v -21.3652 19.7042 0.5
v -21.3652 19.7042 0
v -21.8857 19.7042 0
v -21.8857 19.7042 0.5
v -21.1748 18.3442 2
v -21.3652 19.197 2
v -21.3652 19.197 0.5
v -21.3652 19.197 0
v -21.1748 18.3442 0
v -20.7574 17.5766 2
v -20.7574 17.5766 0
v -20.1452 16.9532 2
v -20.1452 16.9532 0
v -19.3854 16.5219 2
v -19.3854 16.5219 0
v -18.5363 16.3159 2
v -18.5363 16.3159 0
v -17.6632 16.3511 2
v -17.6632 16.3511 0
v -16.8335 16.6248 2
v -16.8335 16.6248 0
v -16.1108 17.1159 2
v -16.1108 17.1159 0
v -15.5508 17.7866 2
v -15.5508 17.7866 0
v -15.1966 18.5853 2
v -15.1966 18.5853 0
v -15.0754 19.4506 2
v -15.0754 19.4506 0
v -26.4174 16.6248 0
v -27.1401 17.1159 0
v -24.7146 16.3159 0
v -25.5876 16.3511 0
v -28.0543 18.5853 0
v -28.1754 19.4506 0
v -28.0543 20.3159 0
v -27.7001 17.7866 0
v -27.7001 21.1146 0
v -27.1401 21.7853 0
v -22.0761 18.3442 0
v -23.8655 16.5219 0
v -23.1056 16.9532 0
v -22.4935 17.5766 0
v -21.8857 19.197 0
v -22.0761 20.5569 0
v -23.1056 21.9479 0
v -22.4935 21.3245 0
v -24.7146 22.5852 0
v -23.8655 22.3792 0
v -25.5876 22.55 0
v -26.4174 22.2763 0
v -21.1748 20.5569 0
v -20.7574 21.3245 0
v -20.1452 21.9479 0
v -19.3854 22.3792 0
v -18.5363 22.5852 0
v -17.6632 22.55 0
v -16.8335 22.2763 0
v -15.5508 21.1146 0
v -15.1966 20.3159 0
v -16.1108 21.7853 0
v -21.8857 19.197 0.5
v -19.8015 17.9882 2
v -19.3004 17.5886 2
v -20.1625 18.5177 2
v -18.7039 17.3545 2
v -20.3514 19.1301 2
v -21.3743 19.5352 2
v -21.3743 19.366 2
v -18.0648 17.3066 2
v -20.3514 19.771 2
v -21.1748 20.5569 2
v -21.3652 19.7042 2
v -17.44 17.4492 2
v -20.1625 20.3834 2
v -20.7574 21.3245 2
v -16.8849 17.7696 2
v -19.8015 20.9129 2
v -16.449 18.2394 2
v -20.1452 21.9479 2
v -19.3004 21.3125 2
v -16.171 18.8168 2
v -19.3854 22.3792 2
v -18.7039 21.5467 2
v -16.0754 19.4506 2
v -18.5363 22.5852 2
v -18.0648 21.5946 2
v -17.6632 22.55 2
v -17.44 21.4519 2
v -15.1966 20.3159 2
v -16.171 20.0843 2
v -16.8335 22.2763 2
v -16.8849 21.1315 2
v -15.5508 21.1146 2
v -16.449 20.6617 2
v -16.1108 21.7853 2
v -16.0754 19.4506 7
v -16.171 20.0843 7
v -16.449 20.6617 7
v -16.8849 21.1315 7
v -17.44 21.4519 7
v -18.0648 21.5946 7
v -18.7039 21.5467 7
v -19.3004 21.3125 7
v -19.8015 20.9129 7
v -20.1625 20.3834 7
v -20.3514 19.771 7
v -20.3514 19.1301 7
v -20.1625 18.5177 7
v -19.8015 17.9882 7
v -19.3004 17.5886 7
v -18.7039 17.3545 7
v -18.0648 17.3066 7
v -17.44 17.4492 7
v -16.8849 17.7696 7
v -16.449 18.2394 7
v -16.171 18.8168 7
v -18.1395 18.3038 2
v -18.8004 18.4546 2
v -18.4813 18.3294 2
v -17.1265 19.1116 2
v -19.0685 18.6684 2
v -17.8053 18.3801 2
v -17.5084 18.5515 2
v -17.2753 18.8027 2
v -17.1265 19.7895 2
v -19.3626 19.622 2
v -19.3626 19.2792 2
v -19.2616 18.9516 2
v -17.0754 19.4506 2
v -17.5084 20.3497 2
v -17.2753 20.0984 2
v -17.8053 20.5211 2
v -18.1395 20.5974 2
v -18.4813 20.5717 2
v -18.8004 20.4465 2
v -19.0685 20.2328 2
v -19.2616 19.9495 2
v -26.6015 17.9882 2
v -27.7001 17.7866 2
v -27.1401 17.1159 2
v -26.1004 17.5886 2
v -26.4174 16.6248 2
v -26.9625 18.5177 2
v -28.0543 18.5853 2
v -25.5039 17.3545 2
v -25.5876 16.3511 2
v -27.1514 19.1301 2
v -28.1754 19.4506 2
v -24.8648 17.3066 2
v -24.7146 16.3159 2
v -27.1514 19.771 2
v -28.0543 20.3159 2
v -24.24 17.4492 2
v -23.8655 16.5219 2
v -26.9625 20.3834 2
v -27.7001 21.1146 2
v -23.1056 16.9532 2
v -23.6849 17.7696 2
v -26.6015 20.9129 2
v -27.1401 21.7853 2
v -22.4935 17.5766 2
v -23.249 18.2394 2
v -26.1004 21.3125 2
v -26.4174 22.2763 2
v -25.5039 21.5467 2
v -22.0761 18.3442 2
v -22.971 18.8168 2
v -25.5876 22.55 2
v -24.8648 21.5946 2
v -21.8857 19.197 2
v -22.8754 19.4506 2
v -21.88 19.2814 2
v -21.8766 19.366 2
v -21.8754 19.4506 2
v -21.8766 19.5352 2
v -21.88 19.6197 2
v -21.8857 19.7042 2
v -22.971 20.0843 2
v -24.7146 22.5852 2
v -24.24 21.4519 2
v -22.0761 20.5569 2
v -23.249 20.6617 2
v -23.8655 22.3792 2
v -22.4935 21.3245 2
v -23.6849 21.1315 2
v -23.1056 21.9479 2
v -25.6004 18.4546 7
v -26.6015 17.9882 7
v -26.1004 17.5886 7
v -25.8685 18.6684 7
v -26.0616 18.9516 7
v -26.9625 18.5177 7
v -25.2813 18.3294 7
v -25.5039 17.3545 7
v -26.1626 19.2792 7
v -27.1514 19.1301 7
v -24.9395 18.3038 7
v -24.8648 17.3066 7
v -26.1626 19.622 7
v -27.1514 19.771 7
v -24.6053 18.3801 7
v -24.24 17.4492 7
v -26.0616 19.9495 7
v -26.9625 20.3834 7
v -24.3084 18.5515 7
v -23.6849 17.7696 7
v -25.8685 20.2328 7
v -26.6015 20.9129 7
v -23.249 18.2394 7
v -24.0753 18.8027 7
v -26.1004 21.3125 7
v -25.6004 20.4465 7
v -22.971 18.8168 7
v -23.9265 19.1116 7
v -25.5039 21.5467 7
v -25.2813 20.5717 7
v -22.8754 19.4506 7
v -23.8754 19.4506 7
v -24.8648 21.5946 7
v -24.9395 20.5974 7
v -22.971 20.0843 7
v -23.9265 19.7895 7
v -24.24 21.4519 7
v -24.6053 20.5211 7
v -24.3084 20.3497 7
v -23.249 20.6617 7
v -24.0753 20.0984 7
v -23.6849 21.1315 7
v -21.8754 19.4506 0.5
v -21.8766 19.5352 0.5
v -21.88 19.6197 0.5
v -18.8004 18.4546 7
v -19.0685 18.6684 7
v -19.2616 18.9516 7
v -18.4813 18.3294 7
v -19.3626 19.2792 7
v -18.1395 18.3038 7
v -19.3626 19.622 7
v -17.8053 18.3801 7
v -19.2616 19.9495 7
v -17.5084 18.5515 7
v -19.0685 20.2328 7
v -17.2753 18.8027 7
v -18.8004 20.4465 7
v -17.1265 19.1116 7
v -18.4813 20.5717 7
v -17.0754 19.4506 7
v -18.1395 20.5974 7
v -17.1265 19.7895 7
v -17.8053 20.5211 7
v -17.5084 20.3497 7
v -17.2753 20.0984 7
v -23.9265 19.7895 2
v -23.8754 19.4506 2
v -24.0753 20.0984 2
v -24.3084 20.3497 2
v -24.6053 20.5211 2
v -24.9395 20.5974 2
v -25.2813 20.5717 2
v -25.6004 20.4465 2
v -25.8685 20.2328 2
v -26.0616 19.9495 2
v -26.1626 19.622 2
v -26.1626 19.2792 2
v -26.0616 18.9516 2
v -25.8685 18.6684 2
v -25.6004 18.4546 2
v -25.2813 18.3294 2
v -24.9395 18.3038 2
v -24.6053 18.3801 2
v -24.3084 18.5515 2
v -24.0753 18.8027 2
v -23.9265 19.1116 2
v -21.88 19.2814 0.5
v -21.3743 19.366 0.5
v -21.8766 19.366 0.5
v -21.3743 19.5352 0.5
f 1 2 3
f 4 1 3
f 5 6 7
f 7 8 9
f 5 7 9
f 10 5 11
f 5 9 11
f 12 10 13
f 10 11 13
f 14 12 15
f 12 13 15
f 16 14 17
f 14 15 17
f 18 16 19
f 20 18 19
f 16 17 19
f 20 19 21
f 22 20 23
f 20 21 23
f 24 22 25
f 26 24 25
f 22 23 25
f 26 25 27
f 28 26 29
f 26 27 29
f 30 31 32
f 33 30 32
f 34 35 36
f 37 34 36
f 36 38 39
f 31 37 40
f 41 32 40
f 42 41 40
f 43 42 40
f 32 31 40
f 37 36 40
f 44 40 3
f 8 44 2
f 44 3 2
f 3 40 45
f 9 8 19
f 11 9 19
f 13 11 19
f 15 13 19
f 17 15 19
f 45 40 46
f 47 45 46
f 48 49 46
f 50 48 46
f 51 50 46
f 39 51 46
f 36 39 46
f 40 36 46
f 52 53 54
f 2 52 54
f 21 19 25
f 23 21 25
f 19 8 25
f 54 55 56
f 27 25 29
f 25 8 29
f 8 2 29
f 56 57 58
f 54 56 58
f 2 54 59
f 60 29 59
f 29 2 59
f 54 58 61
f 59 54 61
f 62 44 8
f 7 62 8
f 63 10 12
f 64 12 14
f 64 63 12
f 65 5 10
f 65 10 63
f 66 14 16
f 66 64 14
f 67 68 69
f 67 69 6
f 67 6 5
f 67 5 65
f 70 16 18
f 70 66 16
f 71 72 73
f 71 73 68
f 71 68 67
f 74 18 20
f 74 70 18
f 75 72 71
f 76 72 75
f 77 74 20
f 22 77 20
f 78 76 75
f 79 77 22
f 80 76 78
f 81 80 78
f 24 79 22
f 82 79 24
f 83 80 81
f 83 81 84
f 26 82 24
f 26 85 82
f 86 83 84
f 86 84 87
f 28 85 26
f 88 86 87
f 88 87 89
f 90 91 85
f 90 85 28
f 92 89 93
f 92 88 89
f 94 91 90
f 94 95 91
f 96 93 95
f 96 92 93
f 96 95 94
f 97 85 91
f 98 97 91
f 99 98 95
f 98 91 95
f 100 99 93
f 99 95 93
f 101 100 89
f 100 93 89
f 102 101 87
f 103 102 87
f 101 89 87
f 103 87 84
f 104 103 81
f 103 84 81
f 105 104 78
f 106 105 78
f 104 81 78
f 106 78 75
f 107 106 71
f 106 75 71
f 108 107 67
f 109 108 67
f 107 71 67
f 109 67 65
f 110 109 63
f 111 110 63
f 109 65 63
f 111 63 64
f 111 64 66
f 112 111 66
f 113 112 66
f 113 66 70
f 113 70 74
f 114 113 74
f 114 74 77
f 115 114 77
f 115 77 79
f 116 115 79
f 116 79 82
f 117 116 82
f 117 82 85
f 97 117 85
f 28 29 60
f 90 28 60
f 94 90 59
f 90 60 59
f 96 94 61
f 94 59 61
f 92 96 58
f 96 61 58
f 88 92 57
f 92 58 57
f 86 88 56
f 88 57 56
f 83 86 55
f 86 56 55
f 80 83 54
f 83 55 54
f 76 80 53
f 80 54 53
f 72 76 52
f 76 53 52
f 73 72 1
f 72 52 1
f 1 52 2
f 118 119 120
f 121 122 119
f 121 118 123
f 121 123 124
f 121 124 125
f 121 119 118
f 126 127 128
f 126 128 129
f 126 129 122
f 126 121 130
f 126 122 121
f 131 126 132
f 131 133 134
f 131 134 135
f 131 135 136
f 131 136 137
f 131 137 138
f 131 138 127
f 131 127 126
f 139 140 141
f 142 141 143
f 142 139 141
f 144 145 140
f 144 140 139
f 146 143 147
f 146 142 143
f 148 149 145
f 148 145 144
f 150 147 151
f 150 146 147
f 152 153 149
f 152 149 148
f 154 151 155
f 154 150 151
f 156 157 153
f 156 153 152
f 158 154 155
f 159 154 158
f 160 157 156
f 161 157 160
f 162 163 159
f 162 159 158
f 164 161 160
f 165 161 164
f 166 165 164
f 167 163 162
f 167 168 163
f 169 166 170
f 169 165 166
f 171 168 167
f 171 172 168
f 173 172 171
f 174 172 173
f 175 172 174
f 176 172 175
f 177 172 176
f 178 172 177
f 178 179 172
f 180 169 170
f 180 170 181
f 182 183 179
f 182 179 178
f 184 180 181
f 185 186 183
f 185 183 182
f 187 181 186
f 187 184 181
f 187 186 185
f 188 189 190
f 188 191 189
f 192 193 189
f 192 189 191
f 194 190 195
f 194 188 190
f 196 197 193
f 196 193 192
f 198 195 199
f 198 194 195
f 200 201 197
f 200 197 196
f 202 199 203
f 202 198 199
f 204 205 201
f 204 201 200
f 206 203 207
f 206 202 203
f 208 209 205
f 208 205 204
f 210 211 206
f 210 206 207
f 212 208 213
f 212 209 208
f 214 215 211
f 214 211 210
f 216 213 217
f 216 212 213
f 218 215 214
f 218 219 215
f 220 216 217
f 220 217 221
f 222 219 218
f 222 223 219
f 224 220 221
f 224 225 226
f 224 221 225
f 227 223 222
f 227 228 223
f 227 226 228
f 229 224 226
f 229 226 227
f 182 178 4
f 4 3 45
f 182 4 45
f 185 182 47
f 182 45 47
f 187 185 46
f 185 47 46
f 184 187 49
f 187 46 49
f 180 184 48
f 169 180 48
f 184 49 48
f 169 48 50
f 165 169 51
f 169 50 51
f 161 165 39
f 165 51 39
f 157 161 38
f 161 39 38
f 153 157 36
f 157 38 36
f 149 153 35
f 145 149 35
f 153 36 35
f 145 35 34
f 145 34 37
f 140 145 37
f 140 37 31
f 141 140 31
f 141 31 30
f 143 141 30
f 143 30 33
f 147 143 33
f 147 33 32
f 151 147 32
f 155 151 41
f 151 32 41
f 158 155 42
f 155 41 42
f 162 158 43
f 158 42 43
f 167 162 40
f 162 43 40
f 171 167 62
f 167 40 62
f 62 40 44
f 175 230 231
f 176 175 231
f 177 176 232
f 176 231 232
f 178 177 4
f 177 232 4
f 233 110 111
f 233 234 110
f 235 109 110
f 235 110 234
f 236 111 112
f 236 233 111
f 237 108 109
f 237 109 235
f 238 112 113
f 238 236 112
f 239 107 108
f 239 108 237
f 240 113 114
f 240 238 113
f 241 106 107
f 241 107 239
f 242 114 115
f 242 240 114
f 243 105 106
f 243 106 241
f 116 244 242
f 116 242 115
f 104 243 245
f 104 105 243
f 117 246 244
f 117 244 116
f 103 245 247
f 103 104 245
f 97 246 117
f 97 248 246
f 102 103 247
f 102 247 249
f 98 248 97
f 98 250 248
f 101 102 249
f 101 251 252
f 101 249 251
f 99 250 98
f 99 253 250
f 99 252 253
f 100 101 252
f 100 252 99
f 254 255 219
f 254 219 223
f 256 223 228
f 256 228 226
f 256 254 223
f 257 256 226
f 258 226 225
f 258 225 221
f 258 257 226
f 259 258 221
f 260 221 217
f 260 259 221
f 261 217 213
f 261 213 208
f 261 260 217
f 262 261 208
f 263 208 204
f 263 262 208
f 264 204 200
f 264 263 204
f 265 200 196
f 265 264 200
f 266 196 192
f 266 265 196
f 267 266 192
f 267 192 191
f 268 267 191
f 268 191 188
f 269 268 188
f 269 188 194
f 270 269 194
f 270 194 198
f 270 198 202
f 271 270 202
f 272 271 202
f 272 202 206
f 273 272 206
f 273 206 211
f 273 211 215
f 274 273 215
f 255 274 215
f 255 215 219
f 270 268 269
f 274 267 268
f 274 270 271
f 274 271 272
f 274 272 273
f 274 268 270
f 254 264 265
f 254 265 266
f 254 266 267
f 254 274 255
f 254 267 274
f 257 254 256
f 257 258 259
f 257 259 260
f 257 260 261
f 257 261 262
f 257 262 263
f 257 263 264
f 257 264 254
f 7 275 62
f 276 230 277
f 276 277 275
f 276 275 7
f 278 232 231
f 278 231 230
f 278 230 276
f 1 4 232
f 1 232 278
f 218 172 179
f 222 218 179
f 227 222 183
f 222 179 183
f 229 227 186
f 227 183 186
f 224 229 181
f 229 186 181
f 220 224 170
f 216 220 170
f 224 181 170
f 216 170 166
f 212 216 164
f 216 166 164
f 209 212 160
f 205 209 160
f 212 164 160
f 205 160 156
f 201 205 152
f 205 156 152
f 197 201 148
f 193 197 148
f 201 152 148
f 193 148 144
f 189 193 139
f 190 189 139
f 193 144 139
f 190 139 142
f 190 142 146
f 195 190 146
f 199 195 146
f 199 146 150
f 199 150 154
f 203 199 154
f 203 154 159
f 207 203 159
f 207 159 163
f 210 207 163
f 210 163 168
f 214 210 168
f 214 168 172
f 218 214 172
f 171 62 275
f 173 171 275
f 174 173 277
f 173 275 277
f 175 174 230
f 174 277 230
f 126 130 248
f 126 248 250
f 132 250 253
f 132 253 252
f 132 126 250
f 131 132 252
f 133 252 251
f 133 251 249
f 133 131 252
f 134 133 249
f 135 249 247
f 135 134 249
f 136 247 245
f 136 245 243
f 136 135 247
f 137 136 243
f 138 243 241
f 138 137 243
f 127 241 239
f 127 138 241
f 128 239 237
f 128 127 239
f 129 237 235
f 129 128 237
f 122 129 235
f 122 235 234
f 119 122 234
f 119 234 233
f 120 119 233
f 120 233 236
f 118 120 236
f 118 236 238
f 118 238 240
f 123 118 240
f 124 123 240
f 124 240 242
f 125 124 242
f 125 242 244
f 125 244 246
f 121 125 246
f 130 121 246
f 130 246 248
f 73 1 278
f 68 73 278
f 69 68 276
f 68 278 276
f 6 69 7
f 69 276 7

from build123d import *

# Parameters (mm, degrees)
F0_R     = 2.15
F0_R_2   = 1.15
F1_DEPTH = 7
F2_DEPTH = 2
F3_DEPTH = 0.5


with BuildPart() as f1:
    # F0 (on Top) → F1 (new body)
    with BuildSketch(Plane.XY):
        with Locations((-25.0254408006, 19.4505679031)):
            Circle(F0_R)
        with Locations((-25.0254408006, 19.4505679031)):
            Circle(F0_R_2, mode=Mode.SUBTRACT)
    extrude(amount=F1_DEPTH)

    # F0 (on Top) → F2 (join)
    with BuildSketch(Plane.XY):
        with BuildLine():
            ThreePointArc((-21.8856664985, 19.1969592827), (-21.8779982633, 19.3236605577), (-21.8754408006, 19.4505679031))
            ThreePointArc((-21.8754408006, 19.4505679031), (-21.8779982633, 19.5774752484), (-21.8856664985, 19.7041765234))
            ThreePointArc((-21.8856664985, 19.7041765234), (-28.1754408006, 19.4505679031), (-21.8856664985, 19.1969592827))
        make_face()
        with Locations((-25.0254408006, 19.4505679031)):
            Circle(F0_R, mode=Mode.SUBTRACT)
        with Locations((-25.0254408006, 19.4505679031)):
            Circle(F0_R_2)
    extrude(amount=F2_DEPTH)



with BuildPart() as f1b:
    # F0 (on Top) → F1, piece 2 (new body)
    with BuildSketch(Plane.XY):
        with Locations((-18.2254408006, 19.4505679031)):
            Circle(F0_R)
        with Locations((-18.2254408006, 19.4505679031)):
            Circle(F0_R_2, mode=Mode.SUBTRACT)
    extrude(amount=F1_DEPTH)

    # F0 (on Top) → F2, piece 2 (join)
    with BuildSketch(Plane.XY):
        with BuildLine():
            ThreePointArc((-15.0754408006, 19.4505679031), (-18.0985334552, 22.5980104404), (-21.3652151026, 19.7041765234))
            ThreePointArc((-21.3652151026, 19.7041765234), (-21.3754408006, 19.4505679031), (-21.3652151026, 19.1969592827))
            ThreePointArc((-21.3652151026, 19.1969592827), (-18.0985334552, 16.3031253657), (-15.0754408006, 19.4505679031))
        make_face()
        with Locations((-18.2254408006, 19.4505679031)):
            Circle(F0_R, mode=Mode.SUBTRACT)
        with Locations((-18.2254408006, 19.4505679031)):
            Circle(F0_R_2)
    extrude(amount=F2_DEPTH)


with BuildPart() as f1_1:
    add(f1.part)

    add(f1b.part)  # F3 merges F1b
    # F0 (on Top) → F3 (join)
    with BuildSketch(Plane.XY):
        with BuildLine():
            ThreePointArc((-21.8856664985, 19.7041765234), (-21.8779982633, 19.5774752484), (-21.8754408006, 19.4505679031))
            ThreePointArc((-21.8754408006, 19.4505679031), (-21.8779982633, 19.3236605577), (-21.8856664985, 19.1969592827))
            Line((-21.8856664985, 19.1969592827), (-21.3652151026, 19.1969592827))
            ThreePointArc((-21.3652151026, 19.1969592827), (-21.3754408006, 19.4505679031), (-21.3652151026, 19.7041765234))
            Line((-21.3652151026, 19.7041765234), (-21.8856664985, 19.7041765234))
        make_face()
    extrude(amount=F3_DEPTH)


solid = f1_1.part
